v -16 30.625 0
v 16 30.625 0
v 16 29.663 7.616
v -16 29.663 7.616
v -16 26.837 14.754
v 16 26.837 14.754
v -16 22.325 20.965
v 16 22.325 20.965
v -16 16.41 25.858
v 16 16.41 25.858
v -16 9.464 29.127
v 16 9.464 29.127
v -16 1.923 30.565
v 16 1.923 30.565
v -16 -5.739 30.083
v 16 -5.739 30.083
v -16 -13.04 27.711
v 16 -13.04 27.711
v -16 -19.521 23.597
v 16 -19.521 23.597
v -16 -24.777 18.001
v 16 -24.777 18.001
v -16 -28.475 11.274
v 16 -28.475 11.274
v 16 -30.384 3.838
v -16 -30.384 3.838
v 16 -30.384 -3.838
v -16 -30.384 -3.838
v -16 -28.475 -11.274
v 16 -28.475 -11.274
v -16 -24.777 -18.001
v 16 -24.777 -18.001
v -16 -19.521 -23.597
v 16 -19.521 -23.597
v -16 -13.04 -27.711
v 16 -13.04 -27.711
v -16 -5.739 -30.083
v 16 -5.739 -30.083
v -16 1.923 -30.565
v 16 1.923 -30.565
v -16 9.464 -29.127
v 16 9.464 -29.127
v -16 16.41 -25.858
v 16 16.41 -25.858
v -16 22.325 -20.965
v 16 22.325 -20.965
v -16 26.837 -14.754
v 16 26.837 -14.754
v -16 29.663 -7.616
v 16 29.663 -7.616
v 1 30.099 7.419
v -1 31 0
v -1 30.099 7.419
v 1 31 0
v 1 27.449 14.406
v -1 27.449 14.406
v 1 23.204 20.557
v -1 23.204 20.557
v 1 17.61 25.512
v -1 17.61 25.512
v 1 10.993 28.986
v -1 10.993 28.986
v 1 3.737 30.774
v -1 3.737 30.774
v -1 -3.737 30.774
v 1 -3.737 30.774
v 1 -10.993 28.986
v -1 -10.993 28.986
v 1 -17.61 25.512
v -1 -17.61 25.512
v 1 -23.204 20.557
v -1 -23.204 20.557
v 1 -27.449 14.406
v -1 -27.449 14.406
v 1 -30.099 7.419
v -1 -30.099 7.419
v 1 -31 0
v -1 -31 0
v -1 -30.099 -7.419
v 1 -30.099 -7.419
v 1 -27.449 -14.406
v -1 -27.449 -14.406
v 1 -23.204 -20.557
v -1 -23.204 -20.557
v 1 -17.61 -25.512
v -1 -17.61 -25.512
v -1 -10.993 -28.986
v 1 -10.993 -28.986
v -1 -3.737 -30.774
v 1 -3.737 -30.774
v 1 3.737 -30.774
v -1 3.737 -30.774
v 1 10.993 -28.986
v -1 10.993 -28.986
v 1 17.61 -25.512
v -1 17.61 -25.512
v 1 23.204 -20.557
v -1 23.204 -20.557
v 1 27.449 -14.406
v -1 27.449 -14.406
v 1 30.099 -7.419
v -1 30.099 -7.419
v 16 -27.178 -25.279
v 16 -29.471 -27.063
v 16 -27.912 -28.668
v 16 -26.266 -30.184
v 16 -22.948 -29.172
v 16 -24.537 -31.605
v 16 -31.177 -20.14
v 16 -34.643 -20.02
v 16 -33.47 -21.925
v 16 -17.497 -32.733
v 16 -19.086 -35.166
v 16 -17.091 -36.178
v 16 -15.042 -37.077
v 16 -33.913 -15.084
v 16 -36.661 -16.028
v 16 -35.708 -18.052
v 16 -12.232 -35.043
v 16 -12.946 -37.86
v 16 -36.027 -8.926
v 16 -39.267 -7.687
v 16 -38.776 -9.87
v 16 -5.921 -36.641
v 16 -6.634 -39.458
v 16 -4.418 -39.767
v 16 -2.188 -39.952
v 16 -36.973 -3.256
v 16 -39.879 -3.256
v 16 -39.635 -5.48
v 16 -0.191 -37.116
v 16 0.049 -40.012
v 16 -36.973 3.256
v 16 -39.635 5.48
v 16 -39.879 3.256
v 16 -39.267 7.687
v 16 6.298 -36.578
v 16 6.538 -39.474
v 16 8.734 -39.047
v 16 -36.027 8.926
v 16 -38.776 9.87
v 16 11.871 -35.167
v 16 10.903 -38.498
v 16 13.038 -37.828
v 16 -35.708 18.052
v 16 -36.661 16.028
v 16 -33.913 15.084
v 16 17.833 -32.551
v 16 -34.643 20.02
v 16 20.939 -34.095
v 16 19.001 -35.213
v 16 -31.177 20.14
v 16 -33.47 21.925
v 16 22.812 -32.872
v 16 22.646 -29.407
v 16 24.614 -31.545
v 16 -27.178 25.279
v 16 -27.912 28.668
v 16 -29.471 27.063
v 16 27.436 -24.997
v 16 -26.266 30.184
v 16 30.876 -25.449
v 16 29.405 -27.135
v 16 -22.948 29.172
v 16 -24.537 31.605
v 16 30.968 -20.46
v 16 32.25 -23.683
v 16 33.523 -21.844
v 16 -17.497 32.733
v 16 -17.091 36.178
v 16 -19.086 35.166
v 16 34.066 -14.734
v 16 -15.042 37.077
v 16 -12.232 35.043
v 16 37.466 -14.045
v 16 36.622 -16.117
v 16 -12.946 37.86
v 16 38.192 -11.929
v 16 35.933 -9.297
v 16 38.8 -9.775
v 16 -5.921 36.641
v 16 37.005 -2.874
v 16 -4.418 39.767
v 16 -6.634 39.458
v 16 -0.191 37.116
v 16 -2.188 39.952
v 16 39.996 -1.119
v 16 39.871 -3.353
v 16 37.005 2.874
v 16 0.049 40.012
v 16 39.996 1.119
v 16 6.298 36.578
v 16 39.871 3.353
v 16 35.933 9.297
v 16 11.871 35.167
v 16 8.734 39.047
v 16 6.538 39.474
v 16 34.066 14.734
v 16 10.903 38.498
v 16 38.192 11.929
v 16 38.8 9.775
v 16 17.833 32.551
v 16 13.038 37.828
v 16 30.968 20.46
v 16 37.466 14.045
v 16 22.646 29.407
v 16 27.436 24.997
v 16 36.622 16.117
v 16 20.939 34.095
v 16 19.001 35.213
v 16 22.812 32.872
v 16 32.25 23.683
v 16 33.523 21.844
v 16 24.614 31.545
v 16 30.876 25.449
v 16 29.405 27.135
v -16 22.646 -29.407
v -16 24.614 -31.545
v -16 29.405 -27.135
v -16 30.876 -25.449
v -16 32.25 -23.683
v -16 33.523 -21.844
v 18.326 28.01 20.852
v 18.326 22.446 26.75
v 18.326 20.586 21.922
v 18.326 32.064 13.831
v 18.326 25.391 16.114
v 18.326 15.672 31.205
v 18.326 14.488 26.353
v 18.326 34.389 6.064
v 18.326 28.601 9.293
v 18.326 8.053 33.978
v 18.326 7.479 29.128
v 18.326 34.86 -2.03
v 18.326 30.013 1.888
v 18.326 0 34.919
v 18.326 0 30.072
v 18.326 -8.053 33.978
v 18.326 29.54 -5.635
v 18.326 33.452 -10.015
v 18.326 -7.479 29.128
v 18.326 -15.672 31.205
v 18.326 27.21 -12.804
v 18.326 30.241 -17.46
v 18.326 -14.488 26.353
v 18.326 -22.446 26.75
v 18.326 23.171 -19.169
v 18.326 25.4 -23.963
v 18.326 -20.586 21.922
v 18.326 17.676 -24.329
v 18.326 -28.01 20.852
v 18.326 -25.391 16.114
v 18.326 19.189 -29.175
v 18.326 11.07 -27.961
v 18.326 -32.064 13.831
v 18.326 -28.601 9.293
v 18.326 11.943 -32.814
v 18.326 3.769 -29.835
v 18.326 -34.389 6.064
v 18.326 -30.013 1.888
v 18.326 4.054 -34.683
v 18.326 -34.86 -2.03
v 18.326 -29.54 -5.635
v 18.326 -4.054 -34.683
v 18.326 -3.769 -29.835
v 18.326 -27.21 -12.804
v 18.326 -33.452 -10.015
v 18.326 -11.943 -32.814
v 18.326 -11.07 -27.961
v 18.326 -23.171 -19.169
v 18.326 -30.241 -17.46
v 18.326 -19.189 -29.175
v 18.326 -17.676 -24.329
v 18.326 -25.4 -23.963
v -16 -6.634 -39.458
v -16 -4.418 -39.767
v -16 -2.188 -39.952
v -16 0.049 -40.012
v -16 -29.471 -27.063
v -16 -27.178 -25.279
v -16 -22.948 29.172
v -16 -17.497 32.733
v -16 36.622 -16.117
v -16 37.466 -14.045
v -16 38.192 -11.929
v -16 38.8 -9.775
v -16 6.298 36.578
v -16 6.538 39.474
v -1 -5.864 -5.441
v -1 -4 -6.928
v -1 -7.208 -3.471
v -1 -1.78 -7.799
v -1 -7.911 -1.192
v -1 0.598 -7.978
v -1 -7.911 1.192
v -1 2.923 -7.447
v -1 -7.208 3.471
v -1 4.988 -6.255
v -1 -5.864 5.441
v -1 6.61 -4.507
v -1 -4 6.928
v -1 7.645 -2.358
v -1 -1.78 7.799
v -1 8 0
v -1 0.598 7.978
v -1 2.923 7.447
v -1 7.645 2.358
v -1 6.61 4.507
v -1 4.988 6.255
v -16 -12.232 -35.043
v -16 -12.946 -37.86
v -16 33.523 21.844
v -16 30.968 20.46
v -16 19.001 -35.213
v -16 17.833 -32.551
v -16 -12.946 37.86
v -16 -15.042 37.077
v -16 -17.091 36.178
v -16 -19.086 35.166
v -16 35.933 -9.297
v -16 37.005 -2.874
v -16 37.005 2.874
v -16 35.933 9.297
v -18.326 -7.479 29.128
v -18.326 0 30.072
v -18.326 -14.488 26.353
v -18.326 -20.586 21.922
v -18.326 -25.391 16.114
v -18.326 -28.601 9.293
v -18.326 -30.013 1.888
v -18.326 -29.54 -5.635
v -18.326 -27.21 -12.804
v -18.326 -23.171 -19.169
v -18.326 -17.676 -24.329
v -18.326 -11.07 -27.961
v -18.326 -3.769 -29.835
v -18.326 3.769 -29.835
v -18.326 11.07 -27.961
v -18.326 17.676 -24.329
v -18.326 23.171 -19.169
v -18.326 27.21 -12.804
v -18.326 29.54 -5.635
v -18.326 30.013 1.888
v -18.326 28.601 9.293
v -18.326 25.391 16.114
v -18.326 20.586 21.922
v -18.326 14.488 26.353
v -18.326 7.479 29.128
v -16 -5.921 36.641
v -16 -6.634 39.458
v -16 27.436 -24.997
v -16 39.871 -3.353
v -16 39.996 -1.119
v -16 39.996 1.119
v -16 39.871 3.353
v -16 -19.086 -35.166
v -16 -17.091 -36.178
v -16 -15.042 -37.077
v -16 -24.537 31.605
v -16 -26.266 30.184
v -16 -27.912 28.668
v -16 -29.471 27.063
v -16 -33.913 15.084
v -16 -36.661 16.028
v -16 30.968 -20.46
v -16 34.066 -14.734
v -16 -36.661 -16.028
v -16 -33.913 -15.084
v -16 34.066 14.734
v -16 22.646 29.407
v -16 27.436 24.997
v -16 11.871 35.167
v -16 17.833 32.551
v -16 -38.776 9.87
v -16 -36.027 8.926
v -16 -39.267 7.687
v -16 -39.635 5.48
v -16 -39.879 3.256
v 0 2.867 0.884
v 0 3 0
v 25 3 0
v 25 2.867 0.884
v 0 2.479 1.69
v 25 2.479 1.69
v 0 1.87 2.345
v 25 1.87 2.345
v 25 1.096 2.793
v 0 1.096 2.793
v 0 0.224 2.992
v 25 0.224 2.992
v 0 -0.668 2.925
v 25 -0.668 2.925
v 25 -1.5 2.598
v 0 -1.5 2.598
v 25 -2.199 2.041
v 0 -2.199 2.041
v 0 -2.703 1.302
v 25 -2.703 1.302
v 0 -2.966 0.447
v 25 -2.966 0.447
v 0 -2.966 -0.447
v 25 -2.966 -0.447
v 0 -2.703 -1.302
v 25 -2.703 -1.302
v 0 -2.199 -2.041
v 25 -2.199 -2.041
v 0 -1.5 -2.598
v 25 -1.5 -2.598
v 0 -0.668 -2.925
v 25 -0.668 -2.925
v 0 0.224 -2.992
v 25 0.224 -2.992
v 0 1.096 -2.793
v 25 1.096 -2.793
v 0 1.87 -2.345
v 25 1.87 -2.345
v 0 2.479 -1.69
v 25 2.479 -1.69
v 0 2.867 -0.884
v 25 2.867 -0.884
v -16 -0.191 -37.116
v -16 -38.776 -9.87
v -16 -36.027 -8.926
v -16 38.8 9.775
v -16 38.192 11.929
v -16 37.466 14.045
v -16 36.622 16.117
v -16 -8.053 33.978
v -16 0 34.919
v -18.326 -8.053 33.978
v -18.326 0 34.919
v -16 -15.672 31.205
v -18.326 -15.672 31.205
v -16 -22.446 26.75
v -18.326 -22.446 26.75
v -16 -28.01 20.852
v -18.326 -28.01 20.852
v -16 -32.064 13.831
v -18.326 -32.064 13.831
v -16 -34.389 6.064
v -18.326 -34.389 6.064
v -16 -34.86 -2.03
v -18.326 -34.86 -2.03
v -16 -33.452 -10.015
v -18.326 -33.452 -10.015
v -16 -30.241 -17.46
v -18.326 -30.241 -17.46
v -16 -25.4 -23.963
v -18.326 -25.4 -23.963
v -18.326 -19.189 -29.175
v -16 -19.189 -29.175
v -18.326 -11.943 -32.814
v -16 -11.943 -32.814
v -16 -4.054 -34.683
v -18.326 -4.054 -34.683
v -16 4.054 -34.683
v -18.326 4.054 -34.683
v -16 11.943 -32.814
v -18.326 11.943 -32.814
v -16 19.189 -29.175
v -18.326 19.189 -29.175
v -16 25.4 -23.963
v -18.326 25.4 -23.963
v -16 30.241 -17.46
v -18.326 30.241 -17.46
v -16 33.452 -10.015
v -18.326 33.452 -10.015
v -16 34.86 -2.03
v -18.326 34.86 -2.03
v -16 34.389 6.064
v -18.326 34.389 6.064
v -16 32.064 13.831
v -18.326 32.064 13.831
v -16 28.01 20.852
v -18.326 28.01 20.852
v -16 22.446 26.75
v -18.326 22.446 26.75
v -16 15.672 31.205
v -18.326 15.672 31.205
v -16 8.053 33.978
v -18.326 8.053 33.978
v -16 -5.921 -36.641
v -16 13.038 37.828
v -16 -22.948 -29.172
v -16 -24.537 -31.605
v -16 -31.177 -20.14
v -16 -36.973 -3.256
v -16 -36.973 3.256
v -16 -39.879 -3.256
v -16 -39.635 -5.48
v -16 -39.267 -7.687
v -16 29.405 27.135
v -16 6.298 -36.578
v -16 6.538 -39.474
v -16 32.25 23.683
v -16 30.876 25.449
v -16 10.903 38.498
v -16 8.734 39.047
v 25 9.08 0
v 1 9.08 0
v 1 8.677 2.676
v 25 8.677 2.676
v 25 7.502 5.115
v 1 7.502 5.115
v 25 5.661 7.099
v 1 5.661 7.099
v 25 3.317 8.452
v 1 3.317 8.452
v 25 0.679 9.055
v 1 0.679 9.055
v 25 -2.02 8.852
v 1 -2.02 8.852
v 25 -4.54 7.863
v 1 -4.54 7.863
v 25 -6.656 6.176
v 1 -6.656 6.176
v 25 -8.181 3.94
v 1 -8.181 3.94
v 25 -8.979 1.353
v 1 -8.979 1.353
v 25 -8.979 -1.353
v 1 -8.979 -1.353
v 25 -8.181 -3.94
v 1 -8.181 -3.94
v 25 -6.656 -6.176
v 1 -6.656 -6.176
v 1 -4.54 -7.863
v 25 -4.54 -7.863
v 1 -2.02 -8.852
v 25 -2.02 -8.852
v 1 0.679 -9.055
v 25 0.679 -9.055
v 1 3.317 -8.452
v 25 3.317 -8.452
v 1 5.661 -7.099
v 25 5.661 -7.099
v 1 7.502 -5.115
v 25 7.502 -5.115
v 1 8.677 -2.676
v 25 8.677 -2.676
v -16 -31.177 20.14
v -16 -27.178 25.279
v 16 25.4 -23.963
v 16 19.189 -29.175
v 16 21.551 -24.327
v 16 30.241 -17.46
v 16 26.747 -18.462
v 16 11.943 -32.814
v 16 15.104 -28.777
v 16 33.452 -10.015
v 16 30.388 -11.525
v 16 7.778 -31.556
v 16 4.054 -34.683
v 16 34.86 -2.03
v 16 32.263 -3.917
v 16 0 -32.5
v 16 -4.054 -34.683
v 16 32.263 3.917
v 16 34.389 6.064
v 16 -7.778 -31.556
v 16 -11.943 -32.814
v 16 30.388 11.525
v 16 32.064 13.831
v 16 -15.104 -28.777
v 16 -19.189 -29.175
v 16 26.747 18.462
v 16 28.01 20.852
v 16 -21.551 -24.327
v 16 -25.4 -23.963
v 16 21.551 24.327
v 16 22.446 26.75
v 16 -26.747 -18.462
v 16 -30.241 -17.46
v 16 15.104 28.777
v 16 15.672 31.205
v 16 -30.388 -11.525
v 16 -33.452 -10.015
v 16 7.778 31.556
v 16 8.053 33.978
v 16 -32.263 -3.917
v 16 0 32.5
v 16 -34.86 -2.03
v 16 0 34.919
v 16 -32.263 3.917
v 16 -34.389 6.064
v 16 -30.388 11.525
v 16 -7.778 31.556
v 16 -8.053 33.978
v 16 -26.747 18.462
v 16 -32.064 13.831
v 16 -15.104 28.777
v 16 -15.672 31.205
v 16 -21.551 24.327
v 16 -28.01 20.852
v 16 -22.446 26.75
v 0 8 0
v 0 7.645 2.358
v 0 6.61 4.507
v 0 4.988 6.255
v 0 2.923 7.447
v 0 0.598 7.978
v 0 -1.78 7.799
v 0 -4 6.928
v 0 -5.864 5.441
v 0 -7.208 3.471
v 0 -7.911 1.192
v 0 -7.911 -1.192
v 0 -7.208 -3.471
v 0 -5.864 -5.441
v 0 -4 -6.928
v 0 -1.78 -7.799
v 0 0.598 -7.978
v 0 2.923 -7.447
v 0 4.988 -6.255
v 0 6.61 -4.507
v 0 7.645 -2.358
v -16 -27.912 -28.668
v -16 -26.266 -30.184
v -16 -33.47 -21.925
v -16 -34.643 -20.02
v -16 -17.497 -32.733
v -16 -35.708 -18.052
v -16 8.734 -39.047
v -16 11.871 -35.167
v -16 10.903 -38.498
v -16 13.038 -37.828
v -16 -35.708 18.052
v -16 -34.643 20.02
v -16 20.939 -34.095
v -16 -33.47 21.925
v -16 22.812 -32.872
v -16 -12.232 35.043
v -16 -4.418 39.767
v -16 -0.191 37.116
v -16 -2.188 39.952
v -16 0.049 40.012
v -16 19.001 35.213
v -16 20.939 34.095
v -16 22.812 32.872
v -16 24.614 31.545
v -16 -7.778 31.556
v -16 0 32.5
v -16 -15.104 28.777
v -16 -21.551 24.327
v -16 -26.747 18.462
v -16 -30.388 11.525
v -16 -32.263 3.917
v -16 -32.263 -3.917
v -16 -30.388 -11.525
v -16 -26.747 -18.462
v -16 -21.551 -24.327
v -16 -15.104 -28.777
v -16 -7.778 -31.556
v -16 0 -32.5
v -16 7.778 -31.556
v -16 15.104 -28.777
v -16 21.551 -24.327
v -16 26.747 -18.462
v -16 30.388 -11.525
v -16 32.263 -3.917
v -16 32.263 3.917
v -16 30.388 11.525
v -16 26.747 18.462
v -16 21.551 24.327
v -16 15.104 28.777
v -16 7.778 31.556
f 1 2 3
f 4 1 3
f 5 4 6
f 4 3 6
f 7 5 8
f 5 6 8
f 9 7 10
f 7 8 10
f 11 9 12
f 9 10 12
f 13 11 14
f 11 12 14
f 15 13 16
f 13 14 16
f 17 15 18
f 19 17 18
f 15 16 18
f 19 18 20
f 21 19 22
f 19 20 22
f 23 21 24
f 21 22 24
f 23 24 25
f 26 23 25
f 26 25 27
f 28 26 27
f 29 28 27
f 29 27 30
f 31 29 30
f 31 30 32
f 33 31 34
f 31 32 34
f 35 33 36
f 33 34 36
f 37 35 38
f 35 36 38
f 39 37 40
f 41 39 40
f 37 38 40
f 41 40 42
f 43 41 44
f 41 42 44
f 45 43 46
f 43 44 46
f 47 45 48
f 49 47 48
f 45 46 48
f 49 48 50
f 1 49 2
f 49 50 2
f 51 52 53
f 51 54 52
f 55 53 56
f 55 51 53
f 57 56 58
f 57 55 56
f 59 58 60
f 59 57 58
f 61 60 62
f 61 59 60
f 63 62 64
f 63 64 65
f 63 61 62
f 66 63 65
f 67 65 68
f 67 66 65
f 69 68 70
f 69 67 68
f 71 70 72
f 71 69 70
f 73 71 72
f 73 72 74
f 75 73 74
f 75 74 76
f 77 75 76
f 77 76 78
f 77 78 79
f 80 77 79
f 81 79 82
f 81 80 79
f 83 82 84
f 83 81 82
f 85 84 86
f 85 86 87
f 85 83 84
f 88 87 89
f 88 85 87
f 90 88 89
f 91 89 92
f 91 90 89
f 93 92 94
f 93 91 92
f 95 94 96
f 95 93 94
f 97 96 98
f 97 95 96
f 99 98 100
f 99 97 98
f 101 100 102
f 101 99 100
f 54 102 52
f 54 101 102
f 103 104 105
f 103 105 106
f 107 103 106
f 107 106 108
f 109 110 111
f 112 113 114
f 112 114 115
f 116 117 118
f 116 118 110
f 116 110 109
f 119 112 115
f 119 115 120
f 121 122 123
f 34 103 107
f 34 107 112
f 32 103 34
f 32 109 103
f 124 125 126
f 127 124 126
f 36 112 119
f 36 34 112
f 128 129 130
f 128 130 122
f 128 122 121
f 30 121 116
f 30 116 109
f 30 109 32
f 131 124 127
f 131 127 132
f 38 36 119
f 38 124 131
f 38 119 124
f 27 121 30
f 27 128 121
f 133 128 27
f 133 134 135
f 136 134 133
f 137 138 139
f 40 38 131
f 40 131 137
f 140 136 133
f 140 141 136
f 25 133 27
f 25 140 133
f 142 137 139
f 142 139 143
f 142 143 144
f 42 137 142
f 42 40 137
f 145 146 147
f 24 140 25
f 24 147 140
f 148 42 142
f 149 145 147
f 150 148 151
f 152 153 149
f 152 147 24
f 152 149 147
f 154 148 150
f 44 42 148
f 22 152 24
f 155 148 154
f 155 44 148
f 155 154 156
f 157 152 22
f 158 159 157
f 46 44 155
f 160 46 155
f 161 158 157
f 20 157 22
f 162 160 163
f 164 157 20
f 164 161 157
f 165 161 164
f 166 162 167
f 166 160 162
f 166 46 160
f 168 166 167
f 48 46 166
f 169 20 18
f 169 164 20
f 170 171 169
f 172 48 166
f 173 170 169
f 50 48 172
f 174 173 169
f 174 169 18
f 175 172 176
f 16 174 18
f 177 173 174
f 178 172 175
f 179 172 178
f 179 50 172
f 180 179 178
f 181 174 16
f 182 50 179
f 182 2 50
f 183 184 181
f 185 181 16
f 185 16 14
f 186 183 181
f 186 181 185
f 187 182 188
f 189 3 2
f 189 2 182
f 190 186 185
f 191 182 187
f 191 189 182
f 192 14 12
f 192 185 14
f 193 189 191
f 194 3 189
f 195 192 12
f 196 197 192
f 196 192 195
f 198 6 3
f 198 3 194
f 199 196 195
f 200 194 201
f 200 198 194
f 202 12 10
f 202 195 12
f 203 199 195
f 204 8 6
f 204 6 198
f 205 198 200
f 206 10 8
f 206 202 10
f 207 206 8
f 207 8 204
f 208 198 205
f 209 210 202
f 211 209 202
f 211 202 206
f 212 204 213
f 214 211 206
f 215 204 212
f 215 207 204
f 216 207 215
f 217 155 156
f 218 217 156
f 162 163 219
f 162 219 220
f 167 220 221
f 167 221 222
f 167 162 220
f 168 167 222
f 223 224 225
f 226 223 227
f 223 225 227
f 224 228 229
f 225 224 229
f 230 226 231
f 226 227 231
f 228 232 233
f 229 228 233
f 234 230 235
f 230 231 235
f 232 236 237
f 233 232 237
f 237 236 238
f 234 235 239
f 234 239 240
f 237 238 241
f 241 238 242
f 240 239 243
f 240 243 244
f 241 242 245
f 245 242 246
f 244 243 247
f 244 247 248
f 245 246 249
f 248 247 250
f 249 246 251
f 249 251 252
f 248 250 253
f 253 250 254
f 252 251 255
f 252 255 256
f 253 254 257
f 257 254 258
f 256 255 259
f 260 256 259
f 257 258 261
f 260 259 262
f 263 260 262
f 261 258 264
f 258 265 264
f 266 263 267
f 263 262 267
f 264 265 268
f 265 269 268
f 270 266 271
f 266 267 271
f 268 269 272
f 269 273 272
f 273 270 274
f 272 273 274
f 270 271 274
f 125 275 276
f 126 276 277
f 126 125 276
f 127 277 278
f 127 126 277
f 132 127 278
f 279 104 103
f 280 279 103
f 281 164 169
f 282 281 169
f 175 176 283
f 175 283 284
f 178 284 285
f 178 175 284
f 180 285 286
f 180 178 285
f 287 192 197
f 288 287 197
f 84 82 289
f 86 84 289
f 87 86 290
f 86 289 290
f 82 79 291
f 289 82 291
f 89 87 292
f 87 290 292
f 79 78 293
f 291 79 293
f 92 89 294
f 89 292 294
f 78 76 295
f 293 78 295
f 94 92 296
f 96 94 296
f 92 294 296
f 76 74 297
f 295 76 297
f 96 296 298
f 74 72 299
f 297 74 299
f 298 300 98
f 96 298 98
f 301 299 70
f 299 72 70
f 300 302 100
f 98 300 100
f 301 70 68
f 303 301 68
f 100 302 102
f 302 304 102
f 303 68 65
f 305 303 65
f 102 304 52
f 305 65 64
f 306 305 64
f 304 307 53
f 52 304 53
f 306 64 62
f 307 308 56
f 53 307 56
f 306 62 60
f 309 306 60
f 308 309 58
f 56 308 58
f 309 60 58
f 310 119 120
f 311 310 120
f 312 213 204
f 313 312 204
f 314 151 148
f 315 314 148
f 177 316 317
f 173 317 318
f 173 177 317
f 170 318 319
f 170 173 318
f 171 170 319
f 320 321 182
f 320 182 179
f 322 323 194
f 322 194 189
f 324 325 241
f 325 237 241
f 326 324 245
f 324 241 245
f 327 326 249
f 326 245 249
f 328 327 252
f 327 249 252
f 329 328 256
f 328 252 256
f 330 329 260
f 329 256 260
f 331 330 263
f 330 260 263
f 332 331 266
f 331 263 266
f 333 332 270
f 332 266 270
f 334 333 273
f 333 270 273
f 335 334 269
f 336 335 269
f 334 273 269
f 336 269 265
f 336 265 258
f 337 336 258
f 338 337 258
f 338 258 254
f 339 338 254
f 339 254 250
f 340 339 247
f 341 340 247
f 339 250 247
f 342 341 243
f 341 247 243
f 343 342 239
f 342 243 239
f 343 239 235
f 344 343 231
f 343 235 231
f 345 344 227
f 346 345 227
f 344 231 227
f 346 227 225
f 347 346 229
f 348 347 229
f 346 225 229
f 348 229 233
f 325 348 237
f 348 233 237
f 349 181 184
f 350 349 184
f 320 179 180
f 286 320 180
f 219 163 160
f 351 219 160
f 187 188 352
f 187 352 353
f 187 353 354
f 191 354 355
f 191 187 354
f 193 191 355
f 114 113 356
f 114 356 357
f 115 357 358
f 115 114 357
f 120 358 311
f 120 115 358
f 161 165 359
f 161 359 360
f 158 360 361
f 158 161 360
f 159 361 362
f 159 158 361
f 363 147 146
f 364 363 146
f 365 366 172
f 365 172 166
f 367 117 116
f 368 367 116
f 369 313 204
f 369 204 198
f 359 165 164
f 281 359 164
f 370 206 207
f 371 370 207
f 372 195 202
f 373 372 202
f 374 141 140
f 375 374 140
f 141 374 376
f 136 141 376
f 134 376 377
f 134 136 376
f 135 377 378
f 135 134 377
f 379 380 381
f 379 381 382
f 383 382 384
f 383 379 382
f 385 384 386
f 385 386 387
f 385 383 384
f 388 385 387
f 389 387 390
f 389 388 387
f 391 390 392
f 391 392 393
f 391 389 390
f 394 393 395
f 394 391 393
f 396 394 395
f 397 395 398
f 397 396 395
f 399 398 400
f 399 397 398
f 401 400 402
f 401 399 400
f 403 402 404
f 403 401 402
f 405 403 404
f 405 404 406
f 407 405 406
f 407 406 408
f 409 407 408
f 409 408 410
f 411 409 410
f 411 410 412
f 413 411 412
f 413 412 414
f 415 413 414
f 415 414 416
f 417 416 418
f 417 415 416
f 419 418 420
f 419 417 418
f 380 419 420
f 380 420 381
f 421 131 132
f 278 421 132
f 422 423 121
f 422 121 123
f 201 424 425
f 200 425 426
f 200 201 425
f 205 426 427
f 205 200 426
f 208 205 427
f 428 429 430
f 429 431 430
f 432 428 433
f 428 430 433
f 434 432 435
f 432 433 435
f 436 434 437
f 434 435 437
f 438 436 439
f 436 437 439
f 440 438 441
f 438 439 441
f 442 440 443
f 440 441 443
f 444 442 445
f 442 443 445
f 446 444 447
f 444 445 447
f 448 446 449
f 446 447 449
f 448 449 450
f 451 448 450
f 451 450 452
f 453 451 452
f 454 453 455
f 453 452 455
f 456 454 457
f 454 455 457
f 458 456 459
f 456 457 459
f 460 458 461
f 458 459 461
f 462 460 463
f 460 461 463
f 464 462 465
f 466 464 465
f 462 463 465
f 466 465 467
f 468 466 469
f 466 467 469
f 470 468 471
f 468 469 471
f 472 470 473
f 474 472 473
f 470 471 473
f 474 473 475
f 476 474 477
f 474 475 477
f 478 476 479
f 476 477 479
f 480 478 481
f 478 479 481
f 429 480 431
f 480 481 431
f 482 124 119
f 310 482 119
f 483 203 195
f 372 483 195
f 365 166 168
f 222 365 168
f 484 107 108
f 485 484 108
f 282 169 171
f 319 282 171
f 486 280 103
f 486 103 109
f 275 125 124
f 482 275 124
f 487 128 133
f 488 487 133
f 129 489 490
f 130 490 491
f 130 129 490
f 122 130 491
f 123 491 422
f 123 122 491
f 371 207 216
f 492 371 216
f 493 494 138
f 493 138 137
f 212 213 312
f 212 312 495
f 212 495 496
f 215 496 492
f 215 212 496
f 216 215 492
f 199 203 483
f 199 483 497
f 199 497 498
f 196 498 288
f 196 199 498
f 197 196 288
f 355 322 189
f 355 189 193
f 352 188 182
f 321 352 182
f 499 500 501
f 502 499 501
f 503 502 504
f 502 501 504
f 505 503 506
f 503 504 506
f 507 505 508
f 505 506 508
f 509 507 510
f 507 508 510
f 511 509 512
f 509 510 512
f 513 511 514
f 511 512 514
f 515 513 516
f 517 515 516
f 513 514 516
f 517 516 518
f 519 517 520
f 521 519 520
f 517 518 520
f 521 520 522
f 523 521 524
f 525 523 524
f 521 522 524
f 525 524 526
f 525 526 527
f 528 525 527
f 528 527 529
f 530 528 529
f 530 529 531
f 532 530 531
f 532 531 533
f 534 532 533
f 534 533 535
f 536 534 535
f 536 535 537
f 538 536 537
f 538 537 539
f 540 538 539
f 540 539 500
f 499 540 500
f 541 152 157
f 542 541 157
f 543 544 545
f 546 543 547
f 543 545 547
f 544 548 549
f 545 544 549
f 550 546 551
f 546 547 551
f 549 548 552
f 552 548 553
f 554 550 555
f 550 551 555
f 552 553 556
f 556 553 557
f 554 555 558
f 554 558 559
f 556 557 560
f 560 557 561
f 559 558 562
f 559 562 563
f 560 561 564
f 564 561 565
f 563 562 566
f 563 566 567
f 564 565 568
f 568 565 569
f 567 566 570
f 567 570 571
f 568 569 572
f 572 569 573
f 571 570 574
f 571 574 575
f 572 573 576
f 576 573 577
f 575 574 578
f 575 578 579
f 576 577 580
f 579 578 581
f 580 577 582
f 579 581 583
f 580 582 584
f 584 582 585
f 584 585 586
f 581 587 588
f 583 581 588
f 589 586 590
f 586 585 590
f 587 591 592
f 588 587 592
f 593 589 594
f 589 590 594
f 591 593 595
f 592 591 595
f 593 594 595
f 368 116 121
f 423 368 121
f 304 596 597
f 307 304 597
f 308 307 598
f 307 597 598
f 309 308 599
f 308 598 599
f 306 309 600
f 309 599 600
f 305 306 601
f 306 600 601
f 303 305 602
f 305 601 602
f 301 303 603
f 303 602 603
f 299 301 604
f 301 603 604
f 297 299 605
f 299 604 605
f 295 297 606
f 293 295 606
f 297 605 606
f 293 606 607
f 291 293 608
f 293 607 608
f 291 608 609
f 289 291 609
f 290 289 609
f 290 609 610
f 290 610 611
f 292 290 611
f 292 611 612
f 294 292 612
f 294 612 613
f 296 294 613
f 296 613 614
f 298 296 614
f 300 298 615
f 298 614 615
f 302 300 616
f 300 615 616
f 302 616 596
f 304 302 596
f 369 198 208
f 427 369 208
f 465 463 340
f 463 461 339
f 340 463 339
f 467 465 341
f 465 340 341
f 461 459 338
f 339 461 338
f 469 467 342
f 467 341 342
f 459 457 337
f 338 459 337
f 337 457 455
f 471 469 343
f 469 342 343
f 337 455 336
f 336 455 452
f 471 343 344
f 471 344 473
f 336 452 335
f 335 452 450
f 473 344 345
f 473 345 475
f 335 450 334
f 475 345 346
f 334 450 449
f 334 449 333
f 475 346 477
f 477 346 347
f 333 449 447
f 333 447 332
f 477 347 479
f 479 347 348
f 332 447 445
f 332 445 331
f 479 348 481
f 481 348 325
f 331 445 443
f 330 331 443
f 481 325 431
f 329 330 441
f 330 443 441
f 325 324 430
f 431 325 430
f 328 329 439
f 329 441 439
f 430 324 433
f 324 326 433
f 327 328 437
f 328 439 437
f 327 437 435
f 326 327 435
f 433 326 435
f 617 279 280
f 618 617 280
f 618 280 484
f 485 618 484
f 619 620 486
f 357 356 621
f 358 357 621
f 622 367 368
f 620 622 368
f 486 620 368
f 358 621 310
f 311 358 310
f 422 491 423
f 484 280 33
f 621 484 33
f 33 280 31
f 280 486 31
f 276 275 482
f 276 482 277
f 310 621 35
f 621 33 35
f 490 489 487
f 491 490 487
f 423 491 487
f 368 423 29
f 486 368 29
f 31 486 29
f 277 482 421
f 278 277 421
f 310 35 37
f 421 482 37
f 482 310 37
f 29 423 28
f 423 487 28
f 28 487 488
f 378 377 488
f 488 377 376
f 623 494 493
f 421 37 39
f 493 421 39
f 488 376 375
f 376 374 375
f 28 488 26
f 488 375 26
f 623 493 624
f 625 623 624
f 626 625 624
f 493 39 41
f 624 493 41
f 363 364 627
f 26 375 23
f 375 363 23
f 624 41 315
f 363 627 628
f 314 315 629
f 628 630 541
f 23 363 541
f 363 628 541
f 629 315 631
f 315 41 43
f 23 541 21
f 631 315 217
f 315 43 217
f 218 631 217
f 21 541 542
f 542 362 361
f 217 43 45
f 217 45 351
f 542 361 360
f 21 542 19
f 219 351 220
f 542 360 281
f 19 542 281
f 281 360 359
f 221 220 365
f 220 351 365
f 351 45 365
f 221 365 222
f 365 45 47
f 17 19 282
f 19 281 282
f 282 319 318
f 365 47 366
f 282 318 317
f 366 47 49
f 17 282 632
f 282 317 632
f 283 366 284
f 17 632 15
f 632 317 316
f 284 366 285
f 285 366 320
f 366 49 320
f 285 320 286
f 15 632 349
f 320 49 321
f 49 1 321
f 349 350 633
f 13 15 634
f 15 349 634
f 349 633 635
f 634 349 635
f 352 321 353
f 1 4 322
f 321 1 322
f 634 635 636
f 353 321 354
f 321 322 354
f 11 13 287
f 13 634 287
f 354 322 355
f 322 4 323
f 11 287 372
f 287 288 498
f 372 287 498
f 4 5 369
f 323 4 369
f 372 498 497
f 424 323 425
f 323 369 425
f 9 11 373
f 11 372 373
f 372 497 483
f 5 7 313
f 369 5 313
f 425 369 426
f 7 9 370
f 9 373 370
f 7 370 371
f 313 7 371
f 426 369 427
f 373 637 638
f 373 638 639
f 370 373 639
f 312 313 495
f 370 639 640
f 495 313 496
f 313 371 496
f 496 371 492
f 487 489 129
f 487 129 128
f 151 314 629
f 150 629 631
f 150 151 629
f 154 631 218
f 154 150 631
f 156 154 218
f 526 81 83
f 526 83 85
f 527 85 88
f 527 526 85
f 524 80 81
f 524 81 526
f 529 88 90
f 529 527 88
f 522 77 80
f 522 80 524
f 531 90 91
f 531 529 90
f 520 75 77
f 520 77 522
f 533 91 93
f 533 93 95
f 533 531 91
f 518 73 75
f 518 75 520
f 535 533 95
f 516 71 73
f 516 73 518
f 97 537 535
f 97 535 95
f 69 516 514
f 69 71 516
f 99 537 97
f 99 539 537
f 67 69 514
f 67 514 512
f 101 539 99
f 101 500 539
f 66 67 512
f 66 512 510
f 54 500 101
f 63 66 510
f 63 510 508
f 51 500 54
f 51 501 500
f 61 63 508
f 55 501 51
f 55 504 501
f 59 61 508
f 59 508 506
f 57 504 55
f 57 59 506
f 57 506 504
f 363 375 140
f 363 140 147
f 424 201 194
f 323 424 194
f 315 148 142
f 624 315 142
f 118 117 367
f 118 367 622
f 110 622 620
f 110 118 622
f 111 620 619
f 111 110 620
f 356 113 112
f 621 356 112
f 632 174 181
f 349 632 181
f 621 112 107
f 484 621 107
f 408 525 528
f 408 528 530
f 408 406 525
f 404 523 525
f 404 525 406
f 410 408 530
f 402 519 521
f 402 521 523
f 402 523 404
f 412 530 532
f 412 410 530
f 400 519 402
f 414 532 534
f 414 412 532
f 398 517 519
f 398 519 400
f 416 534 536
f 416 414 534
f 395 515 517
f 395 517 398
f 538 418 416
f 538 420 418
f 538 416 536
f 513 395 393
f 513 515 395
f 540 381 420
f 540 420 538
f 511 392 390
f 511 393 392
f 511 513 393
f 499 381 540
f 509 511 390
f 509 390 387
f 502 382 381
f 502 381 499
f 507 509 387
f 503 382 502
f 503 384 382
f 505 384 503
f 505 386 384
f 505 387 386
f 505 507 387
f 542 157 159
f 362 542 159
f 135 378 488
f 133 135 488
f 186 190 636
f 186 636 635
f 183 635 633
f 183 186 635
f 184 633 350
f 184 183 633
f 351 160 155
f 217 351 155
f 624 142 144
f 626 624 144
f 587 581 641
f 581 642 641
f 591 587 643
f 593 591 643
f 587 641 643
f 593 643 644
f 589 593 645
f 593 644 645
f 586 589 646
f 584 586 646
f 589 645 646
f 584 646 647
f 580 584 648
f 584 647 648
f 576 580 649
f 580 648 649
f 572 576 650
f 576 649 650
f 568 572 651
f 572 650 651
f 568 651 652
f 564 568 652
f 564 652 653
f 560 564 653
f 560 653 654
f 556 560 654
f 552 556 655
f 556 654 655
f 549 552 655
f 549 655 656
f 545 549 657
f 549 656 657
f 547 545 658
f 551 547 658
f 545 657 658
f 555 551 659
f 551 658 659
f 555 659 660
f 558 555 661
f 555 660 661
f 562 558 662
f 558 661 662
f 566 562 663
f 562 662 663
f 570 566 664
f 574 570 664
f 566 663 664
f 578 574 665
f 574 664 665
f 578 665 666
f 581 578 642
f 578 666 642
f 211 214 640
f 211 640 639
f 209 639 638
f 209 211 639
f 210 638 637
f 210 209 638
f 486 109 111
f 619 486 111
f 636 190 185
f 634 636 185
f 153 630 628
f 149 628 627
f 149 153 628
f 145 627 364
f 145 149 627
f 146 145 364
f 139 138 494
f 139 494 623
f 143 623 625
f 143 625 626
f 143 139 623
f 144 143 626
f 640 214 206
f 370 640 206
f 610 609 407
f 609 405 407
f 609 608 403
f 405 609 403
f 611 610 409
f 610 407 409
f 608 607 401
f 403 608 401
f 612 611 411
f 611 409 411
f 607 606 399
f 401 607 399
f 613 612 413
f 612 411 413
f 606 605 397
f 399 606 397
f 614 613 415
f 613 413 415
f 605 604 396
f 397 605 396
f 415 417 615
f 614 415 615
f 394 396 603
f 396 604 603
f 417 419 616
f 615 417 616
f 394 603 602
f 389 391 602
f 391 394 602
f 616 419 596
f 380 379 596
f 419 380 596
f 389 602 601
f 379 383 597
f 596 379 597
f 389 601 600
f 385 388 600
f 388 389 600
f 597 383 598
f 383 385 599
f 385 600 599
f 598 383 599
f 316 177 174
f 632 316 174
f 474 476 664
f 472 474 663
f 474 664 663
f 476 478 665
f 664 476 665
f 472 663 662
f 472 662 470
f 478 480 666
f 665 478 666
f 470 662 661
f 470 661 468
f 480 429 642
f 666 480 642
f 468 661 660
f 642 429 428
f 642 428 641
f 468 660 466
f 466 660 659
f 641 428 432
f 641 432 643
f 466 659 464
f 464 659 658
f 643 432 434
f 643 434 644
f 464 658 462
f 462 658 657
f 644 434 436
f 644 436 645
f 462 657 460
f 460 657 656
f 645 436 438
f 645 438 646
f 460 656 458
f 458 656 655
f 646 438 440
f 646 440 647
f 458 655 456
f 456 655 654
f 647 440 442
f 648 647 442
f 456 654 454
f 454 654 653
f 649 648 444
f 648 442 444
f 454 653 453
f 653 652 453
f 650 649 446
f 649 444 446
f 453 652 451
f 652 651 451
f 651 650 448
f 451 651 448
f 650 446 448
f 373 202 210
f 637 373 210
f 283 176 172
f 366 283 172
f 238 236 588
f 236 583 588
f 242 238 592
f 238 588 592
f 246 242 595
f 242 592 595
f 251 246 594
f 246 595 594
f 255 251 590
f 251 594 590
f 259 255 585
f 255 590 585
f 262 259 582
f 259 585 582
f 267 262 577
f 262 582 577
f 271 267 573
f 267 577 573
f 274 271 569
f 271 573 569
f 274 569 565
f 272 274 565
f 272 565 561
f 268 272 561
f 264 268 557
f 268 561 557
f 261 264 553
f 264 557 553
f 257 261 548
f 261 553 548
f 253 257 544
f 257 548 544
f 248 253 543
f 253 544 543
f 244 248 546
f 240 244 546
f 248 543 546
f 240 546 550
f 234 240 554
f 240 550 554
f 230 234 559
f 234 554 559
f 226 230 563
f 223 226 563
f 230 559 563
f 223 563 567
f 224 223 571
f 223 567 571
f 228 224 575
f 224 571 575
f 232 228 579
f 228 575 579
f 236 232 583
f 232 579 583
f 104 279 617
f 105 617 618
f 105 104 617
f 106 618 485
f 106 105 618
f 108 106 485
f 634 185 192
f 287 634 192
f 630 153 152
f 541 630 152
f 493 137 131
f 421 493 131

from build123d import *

# Parameters (mm, degrees)
F2_R          = 31
F2_R_2        = 8
F3_DEPTH      = 1
F3_DEPTH_BACK = 1
F4_R          = 9.079941
F4_R_2        = 3
F5_DEPTH      = 25
F7_R          = 40.011924
F7_R_2        = 30.625495
F8_DEPTH      = 32
F9_W          = 9.301454
F9_H          = 6.511014
F10_DEPTH     = 88


with BuildPart() as f1:
    # F0 (on Front) → F1 (revolve)
    with BuildSketch(Plane.XZ):
        Polygon((16, 32.5), (0, 32.5), (-16, 32.5), (-16, 34.919478), (-18.326396, 34.919478), (-18.326396, 30.07248), (0, 30.07248), (18.326396, 30.07248), (18.326396, 34.919478), (16, 34.919478), align=None)
    revolve(axis=Axis((1.106809, 0, 0), (1, 0, 0)))


with BuildPart() as f3:
    # F2 (on Right) → F3 (new body, two sides)
    with BuildSketch(Plane.YZ) as f3_sk:
        Circle(F2_R)
        Circle(F2_R_2, mode=Mode.SUBTRACT)
    extrude(amount=F3_DEPTH)
    extrude(f3_sk.sketch, amount=-F3_DEPTH_BACK)

    # F4 (on Right) → F5 (join)
    with BuildSketch(Plane.YZ):
        Circle(F4_R)
        Circle(F4_R_2, mode=Mode.SUBTRACT)
    extrude(amount=F5_DEPTH)


with BuildPart() as f8:
    # F7 (on offset) → F8 (new body)
    with BuildSketch(Plane.YZ.offset(16)):
        Circle(F7_R)
        Circle(F7_R_2, mode=Mode.SUBTRACT)
    extrude(amount=-F8_DEPTH)

    # F9 (on offset) → F10 (cut)
    with BuildSketch(Plane.YZ.offset(16)):
        with Locations((-41.624017, 0)):
            Rectangle(F9_W, F9_H)
        Polygon((-44.824512, 11.94627), (-36.027037, 8.926093), (-33.912914, 15.084322), (-42.710389, 18.104499), align=None)
        Polygon((-38.516849, 25.853484), (-31.176695, 20.140413), (-27.177547, 25.278517), (-34.517701, 30.991588), align=None)
        Polygon((-28.035287, 36.959071), (-22.947874, 29.172206), (-17.497072, 32.733393), (-22.584485, 40.520258), align=None)
        Polygon((-14.515667, 44.059569), (-12.232295, 35.042738), (-5.920517, 36.641097), (-8.203889, 45.657929), align=None)
        Polygon((0.576951, 46.38553), (-0.191157, 37.115845), (6.297618, 36.57817), (7.065726, 45.847855), align=None)
        Polygon((15.607047, 43.684898), (11.870695, 35.166875), (17.833308, 32.551431), (21.569659, 41.069454), align=None)
        Polygon((28.945877, 36.25033), (22.646174, 29.407028), (27.436482, 24.997239), (33.736185, 31.840541), align=None)
        Polygon((39.147973, 24.887476), (30.967588, 20.460474), (34.066488, 14.734208), (42.246873, 19.161211), align=None)
        Polygon((45.107778, 10.827678), (35.933184, 9.296709), (37.004861, 2.874498), (46.179456, 4.405467), align=None)
        Polygon((46.179456, -4.405467), (37.004861, -2.874498), (35.933184, -9.296709), (45.107778, -10.827678), align=None)
        Polygon((42.246873, -19.161211), (34.066488, -14.734208), (30.967588, -20.460474), (39.147973, -24.887476), align=None)
        Polygon((33.736185, -31.840541), (27.436482, -24.997239), (22.646174, -29.407028), (28.945877, -36.25033), align=None)
        Polygon((21.569659, -41.069454), (17.833308, -32.551431), (11.870695, -35.166875), (15.607047, -43.684898), align=None)
        Polygon((7.065726, -45.847855), (6.297618, -36.57817), (-0.191157, -37.115845), (0.576951, -46.38553), align=None)
        Polygon((-8.203889, -45.657929), (-5.920517, -36.641097), (-12.232295, -35.042738), (-14.515667, -44.059569), align=None)
        Polygon((-22.584485, -40.520258), (-17.497072, -32.733393), (-22.947874, -29.172206), (-28.035287, -36.959071), align=None)
        Polygon((-34.517701, -30.991588), (-27.177547, -25.278517), (-31.176695, -20.140413), (-38.516849, -25.853484), align=None)
        Polygon((-42.710389, -18.104499), (-33.912914, -15.084322), (-36.027037, -8.926093), (-44.824512, -11.94627), align=None)
    extrude(amount=-F10_DEPTH, mode=Mode.SUBTRACT)


solid = Compound([f1.part, f3.part, f8.part])
